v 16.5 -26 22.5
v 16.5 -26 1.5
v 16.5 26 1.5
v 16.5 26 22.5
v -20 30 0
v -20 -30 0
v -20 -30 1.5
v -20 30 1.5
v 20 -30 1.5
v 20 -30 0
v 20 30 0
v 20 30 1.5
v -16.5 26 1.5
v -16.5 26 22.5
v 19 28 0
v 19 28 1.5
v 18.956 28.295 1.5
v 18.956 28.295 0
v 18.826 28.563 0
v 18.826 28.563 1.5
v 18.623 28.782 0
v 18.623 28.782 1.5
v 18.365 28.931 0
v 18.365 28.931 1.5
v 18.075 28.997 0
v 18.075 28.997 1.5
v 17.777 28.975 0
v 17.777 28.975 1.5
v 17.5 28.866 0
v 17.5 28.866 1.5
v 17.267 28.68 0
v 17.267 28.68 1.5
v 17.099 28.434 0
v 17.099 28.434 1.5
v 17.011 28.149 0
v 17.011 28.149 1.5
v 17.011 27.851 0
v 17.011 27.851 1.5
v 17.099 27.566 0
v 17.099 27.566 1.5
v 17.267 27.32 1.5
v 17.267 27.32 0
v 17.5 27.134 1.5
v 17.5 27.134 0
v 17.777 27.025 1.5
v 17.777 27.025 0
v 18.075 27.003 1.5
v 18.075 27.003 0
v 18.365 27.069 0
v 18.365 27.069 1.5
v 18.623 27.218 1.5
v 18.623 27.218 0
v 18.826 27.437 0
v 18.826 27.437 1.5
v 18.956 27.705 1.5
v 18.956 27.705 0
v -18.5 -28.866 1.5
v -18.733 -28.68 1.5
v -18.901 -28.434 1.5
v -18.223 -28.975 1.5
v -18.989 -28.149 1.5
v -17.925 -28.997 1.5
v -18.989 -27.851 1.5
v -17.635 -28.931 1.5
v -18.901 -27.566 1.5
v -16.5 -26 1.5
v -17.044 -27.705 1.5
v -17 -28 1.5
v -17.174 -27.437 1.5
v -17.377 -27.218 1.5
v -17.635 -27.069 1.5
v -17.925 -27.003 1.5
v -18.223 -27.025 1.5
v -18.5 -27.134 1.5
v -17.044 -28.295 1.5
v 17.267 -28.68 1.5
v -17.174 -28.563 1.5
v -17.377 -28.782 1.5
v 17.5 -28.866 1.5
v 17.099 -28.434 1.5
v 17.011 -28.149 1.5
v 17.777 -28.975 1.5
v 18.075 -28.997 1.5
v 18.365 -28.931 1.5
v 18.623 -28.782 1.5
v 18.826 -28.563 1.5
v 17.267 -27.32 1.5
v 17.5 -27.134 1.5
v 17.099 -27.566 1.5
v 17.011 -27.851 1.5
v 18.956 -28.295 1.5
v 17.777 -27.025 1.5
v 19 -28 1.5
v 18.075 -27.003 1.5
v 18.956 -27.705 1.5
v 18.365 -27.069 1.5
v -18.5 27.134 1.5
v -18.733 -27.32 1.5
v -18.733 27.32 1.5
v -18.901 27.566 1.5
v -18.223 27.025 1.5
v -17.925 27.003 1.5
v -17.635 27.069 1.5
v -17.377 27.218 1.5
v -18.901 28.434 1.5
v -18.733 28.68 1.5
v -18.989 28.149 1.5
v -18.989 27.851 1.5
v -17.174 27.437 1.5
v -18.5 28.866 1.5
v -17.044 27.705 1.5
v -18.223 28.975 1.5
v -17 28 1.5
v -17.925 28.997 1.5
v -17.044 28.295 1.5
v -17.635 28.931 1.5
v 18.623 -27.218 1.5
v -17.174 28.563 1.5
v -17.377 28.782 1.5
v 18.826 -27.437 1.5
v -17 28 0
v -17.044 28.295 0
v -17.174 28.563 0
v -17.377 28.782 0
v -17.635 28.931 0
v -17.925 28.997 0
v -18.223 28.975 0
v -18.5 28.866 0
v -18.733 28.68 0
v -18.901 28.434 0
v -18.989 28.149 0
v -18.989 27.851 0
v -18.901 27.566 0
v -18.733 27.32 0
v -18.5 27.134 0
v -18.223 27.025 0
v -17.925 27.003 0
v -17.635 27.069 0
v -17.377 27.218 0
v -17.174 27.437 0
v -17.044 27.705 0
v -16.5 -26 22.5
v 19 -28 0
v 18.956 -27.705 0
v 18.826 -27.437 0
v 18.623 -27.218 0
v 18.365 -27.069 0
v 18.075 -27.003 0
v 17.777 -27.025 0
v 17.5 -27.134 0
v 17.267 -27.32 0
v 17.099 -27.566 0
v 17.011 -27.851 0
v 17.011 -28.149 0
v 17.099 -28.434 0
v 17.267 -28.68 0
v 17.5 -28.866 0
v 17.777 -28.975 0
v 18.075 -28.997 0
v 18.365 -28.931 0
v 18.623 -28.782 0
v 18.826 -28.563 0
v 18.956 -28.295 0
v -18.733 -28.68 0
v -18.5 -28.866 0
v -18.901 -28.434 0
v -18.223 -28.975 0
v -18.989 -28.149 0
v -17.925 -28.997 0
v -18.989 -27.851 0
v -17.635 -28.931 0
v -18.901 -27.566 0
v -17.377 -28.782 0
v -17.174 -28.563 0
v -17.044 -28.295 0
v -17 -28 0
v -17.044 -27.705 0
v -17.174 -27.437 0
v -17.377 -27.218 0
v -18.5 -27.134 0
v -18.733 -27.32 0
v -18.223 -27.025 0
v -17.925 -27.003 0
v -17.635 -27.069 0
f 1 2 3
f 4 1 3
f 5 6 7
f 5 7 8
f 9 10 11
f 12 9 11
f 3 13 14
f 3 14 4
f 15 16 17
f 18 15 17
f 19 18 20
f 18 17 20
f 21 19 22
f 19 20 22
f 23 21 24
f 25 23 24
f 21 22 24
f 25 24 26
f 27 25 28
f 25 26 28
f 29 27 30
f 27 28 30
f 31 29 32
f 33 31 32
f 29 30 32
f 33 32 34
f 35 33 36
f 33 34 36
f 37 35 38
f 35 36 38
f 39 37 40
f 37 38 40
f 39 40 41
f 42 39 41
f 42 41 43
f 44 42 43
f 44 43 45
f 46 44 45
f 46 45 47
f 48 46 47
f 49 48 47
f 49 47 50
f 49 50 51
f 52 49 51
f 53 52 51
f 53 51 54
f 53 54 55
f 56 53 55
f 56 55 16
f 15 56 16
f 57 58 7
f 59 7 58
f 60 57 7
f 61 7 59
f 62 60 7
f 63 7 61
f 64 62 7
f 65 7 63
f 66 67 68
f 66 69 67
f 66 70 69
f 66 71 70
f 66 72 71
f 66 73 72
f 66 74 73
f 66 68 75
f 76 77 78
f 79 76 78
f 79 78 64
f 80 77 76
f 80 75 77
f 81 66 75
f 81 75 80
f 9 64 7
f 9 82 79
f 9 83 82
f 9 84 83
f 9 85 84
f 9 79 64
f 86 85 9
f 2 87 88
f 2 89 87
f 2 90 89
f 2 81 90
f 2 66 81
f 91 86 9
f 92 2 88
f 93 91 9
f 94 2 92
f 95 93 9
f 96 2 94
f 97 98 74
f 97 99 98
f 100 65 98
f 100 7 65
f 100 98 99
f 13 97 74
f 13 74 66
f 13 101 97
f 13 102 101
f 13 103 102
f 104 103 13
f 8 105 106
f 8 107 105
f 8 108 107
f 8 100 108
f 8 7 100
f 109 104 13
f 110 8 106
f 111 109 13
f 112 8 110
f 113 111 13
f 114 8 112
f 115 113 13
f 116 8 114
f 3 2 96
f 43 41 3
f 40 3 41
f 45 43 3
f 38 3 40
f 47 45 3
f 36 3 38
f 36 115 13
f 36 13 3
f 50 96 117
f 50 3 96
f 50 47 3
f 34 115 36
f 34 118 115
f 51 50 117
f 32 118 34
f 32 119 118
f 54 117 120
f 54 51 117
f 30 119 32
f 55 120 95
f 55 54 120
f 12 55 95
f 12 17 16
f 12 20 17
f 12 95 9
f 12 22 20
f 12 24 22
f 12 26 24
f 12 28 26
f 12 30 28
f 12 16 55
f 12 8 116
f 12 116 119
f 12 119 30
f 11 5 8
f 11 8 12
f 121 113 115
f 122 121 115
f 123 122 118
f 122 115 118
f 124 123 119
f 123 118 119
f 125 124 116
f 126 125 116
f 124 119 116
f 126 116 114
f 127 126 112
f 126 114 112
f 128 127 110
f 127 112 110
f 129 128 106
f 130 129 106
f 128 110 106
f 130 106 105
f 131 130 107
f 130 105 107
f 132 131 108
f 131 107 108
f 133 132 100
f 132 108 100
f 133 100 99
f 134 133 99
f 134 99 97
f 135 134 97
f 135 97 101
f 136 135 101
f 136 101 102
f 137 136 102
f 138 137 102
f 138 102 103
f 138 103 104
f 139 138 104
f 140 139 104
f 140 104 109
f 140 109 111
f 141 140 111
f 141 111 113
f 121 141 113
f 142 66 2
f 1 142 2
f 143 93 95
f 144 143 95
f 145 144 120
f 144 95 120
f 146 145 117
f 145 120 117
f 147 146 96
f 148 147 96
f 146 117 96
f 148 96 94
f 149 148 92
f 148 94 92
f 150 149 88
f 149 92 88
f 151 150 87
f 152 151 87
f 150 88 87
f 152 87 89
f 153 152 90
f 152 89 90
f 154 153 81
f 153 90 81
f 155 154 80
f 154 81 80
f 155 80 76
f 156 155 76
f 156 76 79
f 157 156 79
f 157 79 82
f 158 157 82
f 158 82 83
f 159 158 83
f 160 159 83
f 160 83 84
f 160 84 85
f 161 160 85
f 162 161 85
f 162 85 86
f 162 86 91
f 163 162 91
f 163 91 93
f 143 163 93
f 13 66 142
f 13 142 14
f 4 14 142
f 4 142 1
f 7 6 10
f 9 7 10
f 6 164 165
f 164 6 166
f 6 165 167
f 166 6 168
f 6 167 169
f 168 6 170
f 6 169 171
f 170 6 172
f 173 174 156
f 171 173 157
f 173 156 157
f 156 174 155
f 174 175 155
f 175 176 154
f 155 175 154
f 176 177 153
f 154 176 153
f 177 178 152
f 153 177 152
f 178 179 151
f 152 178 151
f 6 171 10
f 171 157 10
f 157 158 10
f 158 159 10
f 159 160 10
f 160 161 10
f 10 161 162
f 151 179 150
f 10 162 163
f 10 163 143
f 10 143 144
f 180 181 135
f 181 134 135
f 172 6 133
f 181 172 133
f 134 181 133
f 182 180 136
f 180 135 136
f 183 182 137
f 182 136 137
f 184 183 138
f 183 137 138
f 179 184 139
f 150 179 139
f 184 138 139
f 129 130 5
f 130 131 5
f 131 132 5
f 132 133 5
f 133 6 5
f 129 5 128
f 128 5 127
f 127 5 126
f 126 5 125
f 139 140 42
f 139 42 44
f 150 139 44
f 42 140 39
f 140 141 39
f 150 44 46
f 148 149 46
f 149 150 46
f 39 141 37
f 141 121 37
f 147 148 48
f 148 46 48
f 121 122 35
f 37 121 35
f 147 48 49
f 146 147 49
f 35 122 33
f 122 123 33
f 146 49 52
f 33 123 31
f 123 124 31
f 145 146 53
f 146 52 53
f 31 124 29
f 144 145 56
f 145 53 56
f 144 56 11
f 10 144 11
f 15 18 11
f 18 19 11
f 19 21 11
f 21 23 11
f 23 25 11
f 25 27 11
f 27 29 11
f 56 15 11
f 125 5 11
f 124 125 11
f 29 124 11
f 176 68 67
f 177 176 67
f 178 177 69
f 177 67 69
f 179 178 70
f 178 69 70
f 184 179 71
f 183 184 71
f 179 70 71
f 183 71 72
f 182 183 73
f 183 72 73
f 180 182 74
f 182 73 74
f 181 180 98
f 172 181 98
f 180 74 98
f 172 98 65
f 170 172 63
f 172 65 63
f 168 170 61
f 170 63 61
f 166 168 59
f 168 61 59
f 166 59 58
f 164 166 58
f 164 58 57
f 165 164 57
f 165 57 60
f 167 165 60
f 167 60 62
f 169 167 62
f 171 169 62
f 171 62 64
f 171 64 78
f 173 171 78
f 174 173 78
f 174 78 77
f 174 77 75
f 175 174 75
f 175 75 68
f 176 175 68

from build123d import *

# Parameters (mm, degrees)
SKETCH_W     = 40
SKETCH_H     = 60
PAD_DEPTH    = 1.5
SKETCH001_R  = 1
POCKET_DEPTH = 1.501
SKETCH002_W  = 33
SKETCH002_H  = 52
PAD001_DEPTH = 21


with BuildPart() as part:
    # Sketch → Pad (new body)
    with BuildSketch(Plane.XY):
        Rectangle(SKETCH_W, SKETCH_H)
    extrude(amount=PAD_DEPTH)

    # Sketch001 (on Face6 of Pad) → Pocket (cut, through all)
    with BuildSketch(Plane.XY.offset(1.5)):
        with Locations((-18, 28)):
            Circle(SKETCH001_R)
        with Locations((18, 28)):
            Circle(SKETCH001_R)
        with Locations((-18, -28)):
            Circle(SKETCH001_R)
        with Locations((18, -28)):
            Circle(SKETCH001_R)
    extrude(amount=-POCKET_DEPTH, mode=Mode.SUBTRACT)

    # Sketch002 (on Face5 of Pocket) → Pad001 (join)
    with BuildSketch(Plane.XY.offset(1.5)):
        Rectangle(SKETCH002_W, SKETCH002_H)
    extrude(amount=PAD001_DEPTH)


solid = part.part
